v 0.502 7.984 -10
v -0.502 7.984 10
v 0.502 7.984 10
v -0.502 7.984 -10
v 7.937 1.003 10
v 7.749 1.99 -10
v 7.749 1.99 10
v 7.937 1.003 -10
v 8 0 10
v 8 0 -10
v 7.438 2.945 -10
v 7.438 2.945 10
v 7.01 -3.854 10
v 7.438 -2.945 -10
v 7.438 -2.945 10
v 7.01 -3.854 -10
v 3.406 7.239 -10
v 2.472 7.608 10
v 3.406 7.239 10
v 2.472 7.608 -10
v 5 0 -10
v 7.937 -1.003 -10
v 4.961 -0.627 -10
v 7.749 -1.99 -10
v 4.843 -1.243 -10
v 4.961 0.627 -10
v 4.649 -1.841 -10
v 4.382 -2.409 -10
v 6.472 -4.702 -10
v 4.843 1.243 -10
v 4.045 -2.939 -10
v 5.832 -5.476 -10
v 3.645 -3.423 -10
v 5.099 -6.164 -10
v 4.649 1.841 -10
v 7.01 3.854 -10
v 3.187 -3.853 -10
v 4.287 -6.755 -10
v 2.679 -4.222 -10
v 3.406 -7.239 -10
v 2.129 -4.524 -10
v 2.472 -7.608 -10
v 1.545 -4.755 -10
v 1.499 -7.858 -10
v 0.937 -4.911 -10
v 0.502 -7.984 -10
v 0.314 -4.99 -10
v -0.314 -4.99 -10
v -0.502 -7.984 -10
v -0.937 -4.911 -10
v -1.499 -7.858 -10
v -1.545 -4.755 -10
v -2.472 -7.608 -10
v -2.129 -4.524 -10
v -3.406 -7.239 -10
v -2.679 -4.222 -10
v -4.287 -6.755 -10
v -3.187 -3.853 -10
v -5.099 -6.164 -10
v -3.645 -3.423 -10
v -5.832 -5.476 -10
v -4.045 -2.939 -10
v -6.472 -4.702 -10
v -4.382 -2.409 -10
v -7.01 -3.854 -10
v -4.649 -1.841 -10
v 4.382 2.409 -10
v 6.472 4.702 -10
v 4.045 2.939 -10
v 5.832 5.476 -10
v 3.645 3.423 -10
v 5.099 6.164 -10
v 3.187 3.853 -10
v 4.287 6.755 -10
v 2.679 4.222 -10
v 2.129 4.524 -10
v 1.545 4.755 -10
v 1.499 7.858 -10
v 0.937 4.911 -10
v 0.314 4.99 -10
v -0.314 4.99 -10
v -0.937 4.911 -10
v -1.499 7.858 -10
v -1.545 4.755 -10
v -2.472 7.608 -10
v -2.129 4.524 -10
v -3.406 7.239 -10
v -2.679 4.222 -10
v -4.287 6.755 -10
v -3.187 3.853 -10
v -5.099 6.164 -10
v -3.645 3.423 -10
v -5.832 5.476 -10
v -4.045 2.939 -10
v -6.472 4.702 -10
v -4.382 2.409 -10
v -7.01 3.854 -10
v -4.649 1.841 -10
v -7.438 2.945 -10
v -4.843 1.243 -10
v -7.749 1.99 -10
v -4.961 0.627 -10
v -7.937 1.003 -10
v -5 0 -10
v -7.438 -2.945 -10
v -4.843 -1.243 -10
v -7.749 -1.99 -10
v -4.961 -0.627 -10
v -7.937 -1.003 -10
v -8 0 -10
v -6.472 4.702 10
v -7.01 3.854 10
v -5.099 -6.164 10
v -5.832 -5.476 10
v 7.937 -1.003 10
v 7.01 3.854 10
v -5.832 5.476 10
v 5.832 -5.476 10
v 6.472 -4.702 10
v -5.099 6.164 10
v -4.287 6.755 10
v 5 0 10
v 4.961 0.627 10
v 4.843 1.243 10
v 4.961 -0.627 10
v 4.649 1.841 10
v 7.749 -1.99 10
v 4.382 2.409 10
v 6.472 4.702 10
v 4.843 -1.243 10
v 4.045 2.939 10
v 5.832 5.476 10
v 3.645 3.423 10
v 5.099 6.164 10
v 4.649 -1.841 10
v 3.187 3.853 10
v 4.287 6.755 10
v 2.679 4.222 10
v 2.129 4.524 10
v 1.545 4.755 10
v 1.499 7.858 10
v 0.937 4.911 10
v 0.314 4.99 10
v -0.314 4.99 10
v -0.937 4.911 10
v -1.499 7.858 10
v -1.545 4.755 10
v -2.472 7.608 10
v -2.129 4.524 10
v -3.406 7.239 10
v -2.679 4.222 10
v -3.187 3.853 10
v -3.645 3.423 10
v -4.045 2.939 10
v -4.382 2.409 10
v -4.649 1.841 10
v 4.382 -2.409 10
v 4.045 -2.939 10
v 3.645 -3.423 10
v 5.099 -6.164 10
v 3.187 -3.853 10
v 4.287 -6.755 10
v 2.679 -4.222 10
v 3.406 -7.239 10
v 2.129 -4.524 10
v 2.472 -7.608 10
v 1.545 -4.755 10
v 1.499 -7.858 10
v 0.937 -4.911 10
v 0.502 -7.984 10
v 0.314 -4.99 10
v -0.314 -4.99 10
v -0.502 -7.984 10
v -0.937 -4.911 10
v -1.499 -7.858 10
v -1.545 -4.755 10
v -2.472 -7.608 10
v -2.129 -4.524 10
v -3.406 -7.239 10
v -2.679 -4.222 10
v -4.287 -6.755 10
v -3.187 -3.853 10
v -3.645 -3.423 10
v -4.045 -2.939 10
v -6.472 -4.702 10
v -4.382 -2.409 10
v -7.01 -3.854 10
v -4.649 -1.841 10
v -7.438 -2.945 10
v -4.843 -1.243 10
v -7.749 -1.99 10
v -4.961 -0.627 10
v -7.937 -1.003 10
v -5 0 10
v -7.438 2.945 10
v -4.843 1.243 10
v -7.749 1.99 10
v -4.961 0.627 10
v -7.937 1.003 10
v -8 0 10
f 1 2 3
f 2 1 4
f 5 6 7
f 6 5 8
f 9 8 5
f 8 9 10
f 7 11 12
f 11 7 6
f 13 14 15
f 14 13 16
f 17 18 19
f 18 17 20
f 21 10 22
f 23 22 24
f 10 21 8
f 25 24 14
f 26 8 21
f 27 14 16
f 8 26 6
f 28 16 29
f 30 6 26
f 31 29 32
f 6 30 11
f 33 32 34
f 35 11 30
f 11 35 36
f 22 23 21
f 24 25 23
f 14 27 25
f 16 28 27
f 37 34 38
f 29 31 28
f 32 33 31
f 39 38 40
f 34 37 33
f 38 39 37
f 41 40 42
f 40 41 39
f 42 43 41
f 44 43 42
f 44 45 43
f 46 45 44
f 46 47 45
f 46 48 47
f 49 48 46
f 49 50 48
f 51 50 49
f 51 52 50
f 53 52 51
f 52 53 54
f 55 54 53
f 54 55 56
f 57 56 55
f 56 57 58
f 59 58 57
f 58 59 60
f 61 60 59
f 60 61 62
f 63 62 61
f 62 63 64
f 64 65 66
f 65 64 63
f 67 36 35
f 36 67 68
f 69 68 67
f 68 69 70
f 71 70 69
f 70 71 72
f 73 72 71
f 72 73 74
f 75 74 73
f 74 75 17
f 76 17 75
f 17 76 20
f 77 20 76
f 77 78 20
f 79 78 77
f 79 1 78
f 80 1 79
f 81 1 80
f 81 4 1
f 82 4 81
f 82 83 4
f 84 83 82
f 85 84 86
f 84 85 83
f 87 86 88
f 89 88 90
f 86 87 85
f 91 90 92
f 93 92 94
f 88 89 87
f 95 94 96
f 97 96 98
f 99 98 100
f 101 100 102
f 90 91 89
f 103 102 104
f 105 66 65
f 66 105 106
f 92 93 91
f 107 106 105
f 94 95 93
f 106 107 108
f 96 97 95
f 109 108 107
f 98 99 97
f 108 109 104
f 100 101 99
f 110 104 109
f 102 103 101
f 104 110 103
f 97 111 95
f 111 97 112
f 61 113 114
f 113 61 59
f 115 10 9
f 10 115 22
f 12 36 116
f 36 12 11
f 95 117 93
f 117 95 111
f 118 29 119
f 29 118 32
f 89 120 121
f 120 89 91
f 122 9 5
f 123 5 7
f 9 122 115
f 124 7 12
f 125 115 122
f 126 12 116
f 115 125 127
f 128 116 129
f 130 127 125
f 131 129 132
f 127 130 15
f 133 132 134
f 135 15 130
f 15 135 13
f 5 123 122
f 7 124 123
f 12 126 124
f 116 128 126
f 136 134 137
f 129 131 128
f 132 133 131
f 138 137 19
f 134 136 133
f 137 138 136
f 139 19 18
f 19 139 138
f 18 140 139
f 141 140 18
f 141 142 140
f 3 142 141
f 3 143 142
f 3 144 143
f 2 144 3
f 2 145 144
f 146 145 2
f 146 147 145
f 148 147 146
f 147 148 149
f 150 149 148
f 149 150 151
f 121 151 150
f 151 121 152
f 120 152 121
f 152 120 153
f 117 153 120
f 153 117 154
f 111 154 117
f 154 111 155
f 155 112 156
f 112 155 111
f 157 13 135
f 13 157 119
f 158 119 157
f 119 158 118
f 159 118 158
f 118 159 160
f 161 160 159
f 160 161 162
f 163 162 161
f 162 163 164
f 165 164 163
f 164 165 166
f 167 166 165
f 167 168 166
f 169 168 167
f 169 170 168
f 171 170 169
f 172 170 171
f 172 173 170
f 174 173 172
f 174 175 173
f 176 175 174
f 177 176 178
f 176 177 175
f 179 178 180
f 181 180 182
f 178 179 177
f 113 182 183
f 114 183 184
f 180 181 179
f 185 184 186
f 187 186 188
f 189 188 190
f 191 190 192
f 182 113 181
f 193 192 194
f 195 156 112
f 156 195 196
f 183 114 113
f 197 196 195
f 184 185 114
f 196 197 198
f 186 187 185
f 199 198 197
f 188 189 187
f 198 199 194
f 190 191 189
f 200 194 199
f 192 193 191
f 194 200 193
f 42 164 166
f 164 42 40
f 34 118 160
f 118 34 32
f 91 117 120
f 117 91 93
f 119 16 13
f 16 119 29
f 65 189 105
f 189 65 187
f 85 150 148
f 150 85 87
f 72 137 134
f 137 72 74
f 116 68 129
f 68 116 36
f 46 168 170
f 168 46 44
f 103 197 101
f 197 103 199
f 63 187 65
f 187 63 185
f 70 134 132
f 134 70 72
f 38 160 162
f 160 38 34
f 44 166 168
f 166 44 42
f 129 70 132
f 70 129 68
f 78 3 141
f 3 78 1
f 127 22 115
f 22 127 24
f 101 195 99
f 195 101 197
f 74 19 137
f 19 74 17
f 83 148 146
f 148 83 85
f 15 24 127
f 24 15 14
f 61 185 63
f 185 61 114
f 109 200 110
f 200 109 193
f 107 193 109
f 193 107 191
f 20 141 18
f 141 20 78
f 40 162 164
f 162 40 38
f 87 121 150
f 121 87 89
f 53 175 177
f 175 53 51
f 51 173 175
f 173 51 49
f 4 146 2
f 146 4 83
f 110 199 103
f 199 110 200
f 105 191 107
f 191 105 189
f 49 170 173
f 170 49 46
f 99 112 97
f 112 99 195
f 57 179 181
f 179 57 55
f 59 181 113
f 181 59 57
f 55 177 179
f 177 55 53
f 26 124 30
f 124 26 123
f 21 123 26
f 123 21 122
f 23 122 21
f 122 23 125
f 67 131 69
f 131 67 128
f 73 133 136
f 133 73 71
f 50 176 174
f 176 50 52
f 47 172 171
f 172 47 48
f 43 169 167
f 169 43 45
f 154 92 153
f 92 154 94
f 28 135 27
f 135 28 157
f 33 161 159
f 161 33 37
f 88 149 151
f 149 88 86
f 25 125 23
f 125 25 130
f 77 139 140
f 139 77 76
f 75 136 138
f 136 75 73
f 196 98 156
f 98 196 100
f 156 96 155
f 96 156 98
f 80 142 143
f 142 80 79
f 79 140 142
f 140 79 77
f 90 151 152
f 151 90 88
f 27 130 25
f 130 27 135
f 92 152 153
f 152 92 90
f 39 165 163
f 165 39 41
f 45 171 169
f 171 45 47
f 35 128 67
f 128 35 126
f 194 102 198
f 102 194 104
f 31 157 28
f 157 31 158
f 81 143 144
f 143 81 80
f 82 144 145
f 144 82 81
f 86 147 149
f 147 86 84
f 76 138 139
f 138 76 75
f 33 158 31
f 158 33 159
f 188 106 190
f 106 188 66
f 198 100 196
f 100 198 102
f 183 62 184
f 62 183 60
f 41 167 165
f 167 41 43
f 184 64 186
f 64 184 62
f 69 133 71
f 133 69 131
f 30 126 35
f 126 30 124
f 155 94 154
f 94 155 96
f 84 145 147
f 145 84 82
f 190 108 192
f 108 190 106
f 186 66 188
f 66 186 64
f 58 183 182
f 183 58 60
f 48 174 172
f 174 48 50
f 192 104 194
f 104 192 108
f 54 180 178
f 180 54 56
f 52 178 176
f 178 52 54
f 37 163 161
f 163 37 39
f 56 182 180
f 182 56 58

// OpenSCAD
$fn = 50;


difference() {
	union() {
		translate(v = [0, 0, -10.0000000000]) {
			cylinder(h = 20, r = 8.0000000000);
		}
	}
	union() {
		translate(v = [0, 0, -100.0000000000]) {
			cylinder(h = 200, r = 5.0000000000);
		}
	}
}
